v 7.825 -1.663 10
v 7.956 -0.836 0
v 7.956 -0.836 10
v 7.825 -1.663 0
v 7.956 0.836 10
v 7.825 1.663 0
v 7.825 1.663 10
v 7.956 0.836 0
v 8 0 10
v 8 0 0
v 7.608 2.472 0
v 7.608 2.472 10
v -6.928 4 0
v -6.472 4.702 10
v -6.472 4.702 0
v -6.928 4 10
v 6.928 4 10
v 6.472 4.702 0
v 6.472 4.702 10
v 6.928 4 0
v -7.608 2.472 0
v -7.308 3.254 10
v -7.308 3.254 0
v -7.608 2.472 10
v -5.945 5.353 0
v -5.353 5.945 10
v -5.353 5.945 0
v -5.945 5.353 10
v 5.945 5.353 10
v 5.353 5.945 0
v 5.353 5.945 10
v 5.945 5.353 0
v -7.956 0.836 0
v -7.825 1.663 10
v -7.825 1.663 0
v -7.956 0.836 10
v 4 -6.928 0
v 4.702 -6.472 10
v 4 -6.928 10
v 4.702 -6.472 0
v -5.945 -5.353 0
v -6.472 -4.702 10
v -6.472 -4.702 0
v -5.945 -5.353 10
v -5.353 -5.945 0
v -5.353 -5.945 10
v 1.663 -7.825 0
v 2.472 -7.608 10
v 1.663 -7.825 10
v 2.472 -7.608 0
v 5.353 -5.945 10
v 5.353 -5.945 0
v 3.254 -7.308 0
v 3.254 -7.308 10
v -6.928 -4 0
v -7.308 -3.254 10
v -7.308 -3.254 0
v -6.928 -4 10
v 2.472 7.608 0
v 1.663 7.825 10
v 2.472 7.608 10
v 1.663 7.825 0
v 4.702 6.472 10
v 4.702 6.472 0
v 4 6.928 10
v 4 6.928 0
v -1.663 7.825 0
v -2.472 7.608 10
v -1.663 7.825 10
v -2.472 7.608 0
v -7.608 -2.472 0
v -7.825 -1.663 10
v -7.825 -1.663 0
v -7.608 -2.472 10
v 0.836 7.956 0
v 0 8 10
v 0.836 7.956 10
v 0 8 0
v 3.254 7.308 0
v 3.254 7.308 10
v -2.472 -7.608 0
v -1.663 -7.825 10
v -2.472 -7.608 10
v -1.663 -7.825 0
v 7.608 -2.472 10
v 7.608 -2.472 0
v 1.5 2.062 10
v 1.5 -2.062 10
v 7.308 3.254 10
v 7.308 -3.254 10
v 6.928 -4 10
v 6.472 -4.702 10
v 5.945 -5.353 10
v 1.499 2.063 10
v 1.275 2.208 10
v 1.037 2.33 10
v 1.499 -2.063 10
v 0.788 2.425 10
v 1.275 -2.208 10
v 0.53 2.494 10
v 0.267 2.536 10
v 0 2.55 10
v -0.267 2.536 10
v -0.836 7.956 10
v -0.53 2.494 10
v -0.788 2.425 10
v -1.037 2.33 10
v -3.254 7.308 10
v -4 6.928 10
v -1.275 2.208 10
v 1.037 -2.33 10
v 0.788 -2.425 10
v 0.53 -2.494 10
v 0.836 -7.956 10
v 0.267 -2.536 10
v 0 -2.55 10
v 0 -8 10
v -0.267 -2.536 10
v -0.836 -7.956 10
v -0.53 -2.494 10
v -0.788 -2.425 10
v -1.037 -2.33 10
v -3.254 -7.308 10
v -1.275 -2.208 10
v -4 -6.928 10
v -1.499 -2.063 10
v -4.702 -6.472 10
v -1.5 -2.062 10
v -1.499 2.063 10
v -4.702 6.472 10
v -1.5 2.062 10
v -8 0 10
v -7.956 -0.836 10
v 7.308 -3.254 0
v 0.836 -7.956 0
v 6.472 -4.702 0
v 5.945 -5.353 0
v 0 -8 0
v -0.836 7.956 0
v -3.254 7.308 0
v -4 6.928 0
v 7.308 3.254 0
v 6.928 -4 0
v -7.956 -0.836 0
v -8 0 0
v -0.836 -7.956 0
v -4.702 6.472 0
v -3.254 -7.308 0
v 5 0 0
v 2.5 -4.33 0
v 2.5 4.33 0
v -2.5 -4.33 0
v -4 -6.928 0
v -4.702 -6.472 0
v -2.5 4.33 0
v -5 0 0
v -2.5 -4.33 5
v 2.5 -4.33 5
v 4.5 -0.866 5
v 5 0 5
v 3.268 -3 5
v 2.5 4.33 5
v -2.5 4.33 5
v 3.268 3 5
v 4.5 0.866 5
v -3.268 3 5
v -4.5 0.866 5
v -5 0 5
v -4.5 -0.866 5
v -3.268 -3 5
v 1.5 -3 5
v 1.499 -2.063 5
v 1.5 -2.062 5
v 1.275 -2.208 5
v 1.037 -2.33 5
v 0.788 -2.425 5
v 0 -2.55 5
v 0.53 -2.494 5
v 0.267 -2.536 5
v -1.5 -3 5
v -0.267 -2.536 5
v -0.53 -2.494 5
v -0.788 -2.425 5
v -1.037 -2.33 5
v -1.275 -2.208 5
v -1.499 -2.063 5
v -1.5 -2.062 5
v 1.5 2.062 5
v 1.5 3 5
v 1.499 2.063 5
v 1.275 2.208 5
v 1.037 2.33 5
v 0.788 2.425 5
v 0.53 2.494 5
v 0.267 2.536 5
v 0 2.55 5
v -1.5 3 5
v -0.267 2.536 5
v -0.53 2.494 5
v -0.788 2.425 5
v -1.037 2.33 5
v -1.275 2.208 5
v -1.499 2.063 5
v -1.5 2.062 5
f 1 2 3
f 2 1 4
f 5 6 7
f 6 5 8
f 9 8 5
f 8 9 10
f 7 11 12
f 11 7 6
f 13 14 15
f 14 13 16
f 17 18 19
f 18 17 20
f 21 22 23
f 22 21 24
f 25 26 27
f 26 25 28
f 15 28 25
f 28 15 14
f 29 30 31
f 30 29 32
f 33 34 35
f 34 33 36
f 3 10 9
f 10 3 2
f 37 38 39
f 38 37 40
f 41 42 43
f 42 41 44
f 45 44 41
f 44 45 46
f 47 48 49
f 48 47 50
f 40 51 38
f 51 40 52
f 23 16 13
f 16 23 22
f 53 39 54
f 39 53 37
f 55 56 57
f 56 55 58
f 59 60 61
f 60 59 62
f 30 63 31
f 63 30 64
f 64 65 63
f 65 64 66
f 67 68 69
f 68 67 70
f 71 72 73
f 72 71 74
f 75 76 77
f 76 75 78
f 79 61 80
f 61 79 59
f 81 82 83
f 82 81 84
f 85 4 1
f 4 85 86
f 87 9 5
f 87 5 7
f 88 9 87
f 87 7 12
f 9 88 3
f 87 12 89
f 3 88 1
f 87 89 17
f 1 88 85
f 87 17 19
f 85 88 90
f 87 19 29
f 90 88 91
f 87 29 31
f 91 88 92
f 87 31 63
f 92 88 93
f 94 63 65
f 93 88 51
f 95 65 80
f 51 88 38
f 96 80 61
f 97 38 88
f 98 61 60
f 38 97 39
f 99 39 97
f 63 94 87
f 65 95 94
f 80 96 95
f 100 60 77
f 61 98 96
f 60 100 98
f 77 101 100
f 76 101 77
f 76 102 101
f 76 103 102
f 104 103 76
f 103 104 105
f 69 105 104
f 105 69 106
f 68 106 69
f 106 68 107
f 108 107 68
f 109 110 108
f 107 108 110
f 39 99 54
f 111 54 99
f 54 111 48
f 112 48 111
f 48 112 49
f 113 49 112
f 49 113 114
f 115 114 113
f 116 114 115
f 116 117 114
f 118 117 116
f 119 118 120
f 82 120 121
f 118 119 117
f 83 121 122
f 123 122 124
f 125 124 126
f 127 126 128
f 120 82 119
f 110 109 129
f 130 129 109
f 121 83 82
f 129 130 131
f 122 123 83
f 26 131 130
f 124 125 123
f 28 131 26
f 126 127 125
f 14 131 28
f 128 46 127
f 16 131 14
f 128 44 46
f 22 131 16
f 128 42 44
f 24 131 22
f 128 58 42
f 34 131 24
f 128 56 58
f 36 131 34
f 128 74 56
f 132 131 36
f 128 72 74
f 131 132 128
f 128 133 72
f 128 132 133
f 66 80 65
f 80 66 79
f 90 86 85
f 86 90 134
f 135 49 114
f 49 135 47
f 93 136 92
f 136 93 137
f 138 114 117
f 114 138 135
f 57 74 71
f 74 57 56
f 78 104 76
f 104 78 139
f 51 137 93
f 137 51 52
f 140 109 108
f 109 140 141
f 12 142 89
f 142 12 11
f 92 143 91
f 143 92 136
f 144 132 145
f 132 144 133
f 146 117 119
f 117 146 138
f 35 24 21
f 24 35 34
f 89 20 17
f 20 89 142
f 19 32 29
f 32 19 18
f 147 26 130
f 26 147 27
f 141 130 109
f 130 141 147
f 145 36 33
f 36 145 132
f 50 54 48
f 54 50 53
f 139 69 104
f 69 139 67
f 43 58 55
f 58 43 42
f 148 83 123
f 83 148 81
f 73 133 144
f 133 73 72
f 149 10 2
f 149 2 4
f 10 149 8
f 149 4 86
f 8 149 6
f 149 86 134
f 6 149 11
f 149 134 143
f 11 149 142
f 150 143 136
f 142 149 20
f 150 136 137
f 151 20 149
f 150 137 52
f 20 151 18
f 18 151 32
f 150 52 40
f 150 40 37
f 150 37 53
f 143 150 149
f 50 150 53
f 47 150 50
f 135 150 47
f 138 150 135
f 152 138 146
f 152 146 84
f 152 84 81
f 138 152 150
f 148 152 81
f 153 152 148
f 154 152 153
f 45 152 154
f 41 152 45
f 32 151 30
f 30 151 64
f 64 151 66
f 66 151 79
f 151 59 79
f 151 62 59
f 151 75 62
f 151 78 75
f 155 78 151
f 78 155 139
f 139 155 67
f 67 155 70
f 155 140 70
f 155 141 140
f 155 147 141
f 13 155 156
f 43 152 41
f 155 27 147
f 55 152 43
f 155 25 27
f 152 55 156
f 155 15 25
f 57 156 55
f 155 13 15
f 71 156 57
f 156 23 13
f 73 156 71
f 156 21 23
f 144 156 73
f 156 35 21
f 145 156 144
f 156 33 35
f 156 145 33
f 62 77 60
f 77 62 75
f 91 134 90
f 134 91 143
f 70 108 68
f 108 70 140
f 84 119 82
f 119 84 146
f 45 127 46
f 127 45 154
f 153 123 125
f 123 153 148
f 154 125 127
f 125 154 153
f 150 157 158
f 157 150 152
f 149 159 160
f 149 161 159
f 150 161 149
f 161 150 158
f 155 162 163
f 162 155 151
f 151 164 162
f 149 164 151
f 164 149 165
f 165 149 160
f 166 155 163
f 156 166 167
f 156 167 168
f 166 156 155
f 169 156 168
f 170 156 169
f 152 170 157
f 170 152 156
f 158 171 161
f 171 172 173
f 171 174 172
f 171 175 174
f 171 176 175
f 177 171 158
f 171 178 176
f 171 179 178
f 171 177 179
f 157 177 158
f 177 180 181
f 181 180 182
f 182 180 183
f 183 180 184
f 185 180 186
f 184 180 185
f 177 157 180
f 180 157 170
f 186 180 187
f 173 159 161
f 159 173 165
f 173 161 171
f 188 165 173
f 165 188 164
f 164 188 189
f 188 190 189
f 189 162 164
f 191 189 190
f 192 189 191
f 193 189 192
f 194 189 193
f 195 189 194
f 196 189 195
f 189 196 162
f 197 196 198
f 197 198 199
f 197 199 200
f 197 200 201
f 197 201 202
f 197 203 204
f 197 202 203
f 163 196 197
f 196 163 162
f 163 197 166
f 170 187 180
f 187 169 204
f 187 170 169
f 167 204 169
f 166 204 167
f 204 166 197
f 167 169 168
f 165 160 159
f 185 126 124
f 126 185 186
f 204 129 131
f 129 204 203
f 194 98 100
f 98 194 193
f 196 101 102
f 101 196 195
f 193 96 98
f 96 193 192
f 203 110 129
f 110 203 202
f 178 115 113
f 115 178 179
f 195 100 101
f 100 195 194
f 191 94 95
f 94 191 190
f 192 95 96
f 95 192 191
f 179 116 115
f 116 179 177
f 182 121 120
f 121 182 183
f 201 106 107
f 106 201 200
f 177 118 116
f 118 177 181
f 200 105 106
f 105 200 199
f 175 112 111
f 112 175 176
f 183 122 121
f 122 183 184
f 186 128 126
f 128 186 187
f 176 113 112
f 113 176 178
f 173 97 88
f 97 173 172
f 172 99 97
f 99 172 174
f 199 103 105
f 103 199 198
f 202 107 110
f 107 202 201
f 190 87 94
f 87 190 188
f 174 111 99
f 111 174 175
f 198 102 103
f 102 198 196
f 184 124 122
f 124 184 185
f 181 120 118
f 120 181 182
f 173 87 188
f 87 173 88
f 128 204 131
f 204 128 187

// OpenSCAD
$fn=60;
difference () {
    cylinder(d=16,h=10);
    cylinder(d=10,h=5,$fn=6);
    cylinder(d=5.1,h=10);
}
translate([1.5,-3,5])
    cube([3,6,5]);
translate([-1.5-3,-3,5])
    cube([3,6,5]);
